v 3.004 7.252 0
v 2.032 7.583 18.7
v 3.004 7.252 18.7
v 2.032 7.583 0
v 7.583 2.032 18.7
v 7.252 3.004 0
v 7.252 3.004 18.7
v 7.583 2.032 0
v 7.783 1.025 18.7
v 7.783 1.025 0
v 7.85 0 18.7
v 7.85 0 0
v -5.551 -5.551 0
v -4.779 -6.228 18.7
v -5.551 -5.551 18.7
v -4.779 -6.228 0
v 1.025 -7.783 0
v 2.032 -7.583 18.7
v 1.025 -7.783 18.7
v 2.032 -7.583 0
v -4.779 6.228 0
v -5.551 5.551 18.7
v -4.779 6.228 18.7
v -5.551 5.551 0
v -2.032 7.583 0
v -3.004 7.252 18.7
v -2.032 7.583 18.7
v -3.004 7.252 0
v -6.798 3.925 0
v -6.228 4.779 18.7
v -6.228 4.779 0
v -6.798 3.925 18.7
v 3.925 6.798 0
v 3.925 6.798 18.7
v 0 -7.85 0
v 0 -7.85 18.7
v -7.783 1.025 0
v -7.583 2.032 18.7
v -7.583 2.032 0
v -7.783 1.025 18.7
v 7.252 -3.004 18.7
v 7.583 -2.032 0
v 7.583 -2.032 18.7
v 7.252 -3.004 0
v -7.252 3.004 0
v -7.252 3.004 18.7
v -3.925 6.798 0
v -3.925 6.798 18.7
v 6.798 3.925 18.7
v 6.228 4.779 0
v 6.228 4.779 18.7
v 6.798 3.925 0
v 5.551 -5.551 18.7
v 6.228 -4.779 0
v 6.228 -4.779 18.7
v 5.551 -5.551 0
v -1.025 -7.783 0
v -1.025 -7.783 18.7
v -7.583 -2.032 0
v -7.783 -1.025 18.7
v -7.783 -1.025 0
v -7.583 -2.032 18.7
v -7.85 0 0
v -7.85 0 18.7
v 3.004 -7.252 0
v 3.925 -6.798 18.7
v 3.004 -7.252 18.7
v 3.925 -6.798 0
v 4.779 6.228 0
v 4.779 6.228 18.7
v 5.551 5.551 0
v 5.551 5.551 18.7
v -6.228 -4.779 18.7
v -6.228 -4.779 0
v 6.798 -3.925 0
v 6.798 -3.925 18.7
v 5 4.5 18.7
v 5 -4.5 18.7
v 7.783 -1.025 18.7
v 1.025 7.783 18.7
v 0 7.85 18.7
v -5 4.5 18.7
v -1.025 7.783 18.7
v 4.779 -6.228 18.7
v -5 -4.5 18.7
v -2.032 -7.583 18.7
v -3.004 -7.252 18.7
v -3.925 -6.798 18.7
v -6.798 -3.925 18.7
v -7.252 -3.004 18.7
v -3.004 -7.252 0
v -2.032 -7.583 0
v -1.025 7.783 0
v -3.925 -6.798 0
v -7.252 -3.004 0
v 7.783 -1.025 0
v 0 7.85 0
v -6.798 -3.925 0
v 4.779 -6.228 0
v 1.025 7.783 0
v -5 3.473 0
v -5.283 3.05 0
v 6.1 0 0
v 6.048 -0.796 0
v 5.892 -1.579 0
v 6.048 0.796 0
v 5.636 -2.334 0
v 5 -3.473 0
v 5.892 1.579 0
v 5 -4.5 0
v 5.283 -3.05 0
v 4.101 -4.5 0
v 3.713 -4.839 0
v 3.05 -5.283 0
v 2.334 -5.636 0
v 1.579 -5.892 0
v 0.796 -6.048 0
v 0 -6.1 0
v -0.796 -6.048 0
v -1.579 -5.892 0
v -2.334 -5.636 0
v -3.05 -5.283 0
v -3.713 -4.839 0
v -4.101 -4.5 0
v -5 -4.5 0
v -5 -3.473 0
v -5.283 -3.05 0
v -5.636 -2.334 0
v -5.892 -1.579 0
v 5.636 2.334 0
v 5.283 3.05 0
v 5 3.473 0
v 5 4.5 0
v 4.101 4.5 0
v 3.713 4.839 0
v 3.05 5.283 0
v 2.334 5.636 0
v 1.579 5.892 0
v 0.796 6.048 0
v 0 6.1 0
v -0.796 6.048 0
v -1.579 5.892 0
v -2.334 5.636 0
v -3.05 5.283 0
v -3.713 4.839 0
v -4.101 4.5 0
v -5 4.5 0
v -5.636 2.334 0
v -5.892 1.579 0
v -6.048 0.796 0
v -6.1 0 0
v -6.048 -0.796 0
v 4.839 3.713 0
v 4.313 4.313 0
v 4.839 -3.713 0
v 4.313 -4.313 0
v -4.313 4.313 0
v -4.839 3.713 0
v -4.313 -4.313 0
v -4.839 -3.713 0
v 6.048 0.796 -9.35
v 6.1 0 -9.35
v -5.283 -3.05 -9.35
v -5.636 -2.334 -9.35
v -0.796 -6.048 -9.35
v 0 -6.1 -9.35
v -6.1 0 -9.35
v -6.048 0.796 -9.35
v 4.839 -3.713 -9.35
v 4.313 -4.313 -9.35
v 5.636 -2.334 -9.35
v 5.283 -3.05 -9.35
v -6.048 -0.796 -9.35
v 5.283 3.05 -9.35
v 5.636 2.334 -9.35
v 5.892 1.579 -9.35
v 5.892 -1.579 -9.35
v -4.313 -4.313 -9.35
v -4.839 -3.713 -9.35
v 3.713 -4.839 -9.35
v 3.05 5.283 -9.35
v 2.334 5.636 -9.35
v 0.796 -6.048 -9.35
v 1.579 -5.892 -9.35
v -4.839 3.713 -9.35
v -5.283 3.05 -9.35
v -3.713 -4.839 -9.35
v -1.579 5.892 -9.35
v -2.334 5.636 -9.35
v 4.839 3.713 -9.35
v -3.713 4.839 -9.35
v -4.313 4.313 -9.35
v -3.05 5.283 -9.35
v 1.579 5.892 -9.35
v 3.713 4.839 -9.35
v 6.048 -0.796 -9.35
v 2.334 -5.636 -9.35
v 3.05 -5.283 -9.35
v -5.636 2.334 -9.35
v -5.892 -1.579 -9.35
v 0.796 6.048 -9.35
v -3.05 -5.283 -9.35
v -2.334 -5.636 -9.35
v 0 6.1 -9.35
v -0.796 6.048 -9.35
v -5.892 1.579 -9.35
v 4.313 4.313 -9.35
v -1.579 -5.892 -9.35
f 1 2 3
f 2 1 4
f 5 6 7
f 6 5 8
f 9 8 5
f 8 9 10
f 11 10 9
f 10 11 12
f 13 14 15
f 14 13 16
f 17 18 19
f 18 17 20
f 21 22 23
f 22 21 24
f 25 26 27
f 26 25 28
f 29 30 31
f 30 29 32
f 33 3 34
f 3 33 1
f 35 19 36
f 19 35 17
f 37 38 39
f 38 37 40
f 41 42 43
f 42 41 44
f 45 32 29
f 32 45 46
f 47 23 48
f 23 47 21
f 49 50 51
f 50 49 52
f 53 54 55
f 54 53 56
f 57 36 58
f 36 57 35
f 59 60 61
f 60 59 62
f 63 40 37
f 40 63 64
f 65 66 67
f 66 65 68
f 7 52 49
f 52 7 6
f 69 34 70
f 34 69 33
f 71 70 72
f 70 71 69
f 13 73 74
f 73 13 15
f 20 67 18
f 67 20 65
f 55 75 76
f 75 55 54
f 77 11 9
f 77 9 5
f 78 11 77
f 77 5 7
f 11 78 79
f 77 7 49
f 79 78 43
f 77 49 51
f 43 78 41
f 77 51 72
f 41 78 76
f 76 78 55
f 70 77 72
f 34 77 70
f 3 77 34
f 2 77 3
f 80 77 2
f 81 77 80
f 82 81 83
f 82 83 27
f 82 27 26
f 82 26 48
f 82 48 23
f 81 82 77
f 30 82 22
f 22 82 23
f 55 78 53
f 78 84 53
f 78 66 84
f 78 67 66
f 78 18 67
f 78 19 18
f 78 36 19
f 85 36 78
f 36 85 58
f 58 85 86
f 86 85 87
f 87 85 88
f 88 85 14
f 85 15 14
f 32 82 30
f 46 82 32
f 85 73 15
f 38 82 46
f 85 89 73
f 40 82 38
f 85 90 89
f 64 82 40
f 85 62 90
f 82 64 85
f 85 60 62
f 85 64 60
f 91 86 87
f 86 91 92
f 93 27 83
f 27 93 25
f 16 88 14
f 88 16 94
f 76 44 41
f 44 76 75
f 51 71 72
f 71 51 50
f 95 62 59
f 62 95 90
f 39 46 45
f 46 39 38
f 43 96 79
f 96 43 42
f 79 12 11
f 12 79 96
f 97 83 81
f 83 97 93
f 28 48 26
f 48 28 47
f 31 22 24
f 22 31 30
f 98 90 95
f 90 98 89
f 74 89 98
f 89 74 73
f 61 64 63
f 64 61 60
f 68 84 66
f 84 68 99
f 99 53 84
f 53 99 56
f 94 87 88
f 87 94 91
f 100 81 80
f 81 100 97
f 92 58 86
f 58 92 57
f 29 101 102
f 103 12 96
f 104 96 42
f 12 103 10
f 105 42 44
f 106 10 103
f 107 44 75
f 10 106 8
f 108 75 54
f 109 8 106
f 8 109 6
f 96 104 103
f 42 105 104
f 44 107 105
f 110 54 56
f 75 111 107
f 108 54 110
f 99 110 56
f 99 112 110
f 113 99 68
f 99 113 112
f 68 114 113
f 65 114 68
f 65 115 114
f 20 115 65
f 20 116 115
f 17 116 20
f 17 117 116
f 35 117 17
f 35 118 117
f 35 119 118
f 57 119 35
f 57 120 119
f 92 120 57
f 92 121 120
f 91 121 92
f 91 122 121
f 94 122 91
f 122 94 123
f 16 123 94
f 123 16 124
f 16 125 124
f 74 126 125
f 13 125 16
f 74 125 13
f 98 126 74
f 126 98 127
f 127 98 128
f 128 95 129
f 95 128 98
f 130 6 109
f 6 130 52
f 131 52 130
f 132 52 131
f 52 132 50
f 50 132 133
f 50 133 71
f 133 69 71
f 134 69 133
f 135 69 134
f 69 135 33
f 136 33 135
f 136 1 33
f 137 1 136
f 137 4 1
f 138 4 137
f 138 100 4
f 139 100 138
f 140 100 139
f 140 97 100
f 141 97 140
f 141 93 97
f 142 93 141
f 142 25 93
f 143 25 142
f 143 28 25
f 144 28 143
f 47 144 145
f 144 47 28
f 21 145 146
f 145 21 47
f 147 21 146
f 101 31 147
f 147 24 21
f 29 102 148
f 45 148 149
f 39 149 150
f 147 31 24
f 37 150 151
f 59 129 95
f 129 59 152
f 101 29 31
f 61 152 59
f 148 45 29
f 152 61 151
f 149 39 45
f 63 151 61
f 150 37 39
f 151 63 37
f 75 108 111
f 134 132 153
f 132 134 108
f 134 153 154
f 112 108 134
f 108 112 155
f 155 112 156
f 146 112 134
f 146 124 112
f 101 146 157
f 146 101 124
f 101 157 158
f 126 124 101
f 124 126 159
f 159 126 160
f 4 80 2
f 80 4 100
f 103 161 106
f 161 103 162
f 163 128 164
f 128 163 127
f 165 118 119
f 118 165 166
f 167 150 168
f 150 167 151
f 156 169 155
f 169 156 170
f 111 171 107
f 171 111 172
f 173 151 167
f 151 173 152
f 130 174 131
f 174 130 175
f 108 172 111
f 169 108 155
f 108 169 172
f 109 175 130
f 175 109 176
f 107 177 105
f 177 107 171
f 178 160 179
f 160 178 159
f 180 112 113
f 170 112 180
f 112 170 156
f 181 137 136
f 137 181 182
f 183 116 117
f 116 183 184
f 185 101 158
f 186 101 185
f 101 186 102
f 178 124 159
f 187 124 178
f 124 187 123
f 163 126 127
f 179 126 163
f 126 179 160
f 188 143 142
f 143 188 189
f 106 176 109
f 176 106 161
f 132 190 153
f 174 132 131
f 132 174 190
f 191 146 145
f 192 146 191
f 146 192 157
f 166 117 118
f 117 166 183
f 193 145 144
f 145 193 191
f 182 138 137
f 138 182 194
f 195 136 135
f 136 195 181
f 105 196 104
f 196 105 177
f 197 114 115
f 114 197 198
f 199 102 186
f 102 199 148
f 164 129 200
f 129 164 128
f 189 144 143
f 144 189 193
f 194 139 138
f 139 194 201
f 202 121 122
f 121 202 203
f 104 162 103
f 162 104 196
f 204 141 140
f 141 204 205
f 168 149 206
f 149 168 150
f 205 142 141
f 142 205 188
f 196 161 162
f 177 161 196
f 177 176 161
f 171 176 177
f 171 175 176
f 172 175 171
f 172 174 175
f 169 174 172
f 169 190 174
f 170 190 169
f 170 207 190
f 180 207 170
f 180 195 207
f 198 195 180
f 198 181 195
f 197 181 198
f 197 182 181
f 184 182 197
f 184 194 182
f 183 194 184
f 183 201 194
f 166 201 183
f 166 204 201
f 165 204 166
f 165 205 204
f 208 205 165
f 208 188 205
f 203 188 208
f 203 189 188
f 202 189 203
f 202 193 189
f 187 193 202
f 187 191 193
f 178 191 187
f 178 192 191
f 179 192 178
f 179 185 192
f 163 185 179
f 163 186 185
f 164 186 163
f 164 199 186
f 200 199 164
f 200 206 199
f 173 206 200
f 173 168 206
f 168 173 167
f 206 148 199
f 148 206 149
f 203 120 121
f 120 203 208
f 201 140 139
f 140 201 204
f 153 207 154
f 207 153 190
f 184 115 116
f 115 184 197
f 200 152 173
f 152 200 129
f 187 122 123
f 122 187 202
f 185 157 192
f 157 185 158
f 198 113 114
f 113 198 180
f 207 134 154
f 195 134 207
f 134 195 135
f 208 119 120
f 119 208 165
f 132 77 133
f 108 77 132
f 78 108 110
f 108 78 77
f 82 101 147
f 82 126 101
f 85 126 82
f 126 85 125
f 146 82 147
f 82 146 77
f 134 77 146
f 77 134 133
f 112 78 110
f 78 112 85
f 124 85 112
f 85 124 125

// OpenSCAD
// Snap-on tube clip for a lab stand rod, printed flat with a Z height of 10 mm.
// Snaps onto a round rod (e.g. a 12.7 mm lab stand rod) and a tube (e.g. a 6 mm id
// tube) next to each other. NOVEL general part.
//

rod_d   = 12.7;
wall    = 3;
tubing_d= 6;
tubing_h= 3;
bridge_w= 6;
opening_w = 10;

$fn = 48;

ring_o  = rod_d + wall;
ring_i  = rod_d - 0.5;                 // slightly smaller than the rod for a better grip
tube_o  = tubing_d + 2 * wall;

difference() {
    union() {
        cylinder(h = 18.7, d = ring_o);              // ring: outer band around the rod
        translate([0, 0, -9.35]) cylinder(h = 18.7, d = ring_i);
    }
    translate([-opening_w / 2, -4.5, 0]) cube([opening_w, 9, 18.7]);                 // snap opening: remove X < 0 and -5 < y < 5
    translate([15 - 0.01, -3, 0]) cylinder(h = 6, d = tube_o);                        // tube ring: band around the tube
    translate([15 + bridge_w / 2, -3, 0]) cube([bridge_w, 6, 10]);                   // bridge between the two rings
}
